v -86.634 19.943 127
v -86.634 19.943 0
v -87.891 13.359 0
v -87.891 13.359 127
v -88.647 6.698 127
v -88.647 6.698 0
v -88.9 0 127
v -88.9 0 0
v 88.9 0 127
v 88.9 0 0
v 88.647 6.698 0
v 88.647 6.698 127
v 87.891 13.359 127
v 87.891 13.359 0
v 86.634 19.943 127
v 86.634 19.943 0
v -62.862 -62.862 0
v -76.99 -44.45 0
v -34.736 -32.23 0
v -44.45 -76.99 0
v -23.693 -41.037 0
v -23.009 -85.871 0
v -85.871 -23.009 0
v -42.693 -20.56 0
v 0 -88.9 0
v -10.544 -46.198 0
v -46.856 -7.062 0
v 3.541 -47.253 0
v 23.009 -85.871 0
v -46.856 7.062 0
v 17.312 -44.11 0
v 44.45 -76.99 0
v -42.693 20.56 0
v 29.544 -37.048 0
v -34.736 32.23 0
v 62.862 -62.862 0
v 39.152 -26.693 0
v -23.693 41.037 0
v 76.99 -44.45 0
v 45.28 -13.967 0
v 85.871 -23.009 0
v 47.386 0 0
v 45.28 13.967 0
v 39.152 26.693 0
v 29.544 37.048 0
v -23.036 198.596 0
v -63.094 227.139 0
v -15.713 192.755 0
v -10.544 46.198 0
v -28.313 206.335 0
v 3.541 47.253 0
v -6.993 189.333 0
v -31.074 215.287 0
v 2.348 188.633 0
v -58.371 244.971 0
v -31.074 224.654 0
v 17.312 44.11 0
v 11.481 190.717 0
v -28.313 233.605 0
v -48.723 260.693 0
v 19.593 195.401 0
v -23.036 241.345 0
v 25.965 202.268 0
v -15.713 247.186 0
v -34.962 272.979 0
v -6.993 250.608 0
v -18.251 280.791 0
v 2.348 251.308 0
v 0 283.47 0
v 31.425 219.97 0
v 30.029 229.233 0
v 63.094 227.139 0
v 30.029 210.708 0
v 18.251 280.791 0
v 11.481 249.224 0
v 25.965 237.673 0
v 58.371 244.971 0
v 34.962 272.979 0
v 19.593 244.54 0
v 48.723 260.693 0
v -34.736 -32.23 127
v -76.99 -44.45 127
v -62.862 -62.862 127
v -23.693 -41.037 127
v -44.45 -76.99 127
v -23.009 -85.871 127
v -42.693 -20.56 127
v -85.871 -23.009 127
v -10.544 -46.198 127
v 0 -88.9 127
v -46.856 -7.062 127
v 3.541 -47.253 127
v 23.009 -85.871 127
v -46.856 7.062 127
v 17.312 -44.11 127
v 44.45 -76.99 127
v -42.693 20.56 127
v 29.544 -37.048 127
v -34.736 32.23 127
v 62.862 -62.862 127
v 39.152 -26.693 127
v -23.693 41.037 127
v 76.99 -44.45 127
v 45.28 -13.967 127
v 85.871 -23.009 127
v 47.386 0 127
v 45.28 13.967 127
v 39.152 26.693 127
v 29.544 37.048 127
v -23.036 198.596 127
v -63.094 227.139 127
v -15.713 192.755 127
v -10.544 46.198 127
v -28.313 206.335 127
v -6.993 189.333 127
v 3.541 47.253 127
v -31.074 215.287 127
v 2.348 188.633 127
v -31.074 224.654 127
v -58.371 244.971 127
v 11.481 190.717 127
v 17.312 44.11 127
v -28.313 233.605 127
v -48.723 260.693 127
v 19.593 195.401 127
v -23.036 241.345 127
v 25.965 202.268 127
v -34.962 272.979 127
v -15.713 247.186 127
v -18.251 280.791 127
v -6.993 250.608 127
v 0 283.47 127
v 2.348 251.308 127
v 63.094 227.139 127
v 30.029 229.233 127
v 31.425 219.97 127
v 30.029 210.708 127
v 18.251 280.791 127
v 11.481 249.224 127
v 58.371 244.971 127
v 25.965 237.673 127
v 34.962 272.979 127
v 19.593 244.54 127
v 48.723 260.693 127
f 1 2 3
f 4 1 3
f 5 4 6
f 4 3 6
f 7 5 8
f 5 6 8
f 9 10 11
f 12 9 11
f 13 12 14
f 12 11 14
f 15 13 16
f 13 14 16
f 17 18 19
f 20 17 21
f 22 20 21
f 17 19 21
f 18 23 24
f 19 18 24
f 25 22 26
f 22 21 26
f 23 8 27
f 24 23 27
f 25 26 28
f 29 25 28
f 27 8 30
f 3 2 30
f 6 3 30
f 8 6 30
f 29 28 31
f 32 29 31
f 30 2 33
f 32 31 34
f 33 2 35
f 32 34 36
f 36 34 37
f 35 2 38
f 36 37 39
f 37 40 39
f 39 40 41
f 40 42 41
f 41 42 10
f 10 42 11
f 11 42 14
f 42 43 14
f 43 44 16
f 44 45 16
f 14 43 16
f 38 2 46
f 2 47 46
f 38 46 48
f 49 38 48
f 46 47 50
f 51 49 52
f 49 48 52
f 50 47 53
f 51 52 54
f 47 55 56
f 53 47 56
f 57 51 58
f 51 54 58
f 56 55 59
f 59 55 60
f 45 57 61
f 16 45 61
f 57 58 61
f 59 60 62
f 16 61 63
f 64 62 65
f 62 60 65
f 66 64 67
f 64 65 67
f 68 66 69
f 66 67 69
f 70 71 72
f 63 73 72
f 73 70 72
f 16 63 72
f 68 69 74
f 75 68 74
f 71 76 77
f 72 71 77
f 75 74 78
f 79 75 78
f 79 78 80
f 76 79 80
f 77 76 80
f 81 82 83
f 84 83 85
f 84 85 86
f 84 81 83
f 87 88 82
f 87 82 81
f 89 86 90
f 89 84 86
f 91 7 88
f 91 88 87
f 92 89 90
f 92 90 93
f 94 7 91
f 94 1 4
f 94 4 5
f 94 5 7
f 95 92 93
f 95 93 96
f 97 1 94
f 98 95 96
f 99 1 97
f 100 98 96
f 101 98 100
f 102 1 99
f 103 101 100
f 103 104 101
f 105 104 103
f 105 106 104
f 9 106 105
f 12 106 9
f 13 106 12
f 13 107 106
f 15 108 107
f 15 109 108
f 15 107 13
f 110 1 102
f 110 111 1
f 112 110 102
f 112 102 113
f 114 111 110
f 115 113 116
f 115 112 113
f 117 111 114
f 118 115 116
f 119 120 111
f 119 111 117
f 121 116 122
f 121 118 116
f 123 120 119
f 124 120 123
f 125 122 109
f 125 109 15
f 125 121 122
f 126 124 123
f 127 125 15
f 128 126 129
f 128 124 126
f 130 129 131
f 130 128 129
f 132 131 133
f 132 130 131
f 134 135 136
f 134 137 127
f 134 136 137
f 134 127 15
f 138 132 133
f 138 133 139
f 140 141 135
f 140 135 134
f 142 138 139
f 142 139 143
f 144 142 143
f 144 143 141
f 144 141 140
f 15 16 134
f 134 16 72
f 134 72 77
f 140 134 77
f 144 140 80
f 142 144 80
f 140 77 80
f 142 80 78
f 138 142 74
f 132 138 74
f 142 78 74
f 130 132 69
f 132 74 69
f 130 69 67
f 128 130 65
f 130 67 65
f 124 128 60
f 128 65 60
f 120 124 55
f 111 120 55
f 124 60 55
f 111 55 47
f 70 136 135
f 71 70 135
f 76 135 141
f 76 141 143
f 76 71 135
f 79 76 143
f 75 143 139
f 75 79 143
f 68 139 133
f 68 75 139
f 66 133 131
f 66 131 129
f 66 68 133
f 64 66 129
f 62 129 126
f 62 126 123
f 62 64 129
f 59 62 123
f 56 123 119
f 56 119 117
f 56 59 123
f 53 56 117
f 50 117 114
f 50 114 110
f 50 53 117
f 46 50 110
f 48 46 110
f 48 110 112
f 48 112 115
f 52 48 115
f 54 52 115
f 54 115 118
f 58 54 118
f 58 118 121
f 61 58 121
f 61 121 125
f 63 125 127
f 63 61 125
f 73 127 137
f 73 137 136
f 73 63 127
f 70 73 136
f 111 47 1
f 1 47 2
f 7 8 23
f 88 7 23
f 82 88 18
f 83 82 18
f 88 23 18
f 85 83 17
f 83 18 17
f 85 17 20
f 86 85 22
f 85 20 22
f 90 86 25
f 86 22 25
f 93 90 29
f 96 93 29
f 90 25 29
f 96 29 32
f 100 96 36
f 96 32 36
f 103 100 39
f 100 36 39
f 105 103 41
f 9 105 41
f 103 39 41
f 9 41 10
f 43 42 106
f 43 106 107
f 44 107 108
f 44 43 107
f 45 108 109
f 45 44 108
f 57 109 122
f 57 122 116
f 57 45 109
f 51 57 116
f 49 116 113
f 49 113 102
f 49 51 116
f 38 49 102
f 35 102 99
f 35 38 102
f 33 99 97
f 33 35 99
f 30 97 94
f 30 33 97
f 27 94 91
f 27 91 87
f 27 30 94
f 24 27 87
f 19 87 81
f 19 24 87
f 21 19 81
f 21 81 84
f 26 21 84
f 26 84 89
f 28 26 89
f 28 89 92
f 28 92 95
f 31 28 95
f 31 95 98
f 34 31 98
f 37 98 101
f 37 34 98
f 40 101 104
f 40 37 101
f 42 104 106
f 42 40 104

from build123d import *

# Parameters (mm, degrees)
F0_R     = 47.385597
F0_R_2   = 31.425438
F1_DEPTH = 127


with BuildPart() as f1:
    # F0 (on Top) → F1 (new body)
    with BuildSketch(Plane.XY):
        with BuildLine():
            Line((-86.634222, 19.942958), (-88.9, 0))
            ThreePointArc((-88.9, 0), (0, -88.9), (88.9, 0))
            Line((88.9, 0), (86.634222, 19.942958))
            ThreePointArc((86.634222, 19.942958), (0, 88.9), (-86.634222, 19.942958))
        make_face()
        Circle(F0_R, mode=Mode.SUBTRACT)
        with BuildLine():
            ThreePointArc((-86.634222, 19.942958), (-88.331739, 10.035628), (-88.9, 0))
            Line((-88.9, 0), (-86.634222, 19.942958))
        make_face()
        with BuildLine():
            Line((86.634222, 19.942958), (88.9, 0))
            ThreePointArc((88.9, 0), (88.331739, 10.035628), (86.634222, 19.942958))
        make_face()
        with BuildLine():
            Line((-63.0941, 227.138758), (-86.634222, 19.942958))
            ThreePointArc((-86.634222, 19.942958), (0, 88.9), (86.634222, 19.942958))
            Line((86.634222, 19.942958), (63.0941, 227.138758))
            ThreePointArc((63.0941, 227.138758), (63.398444, 223.560347), (63.5, 219.970453))
            ThreePointArc((63.5, 219.970453), (-3.589894, 156.572009), (-63.0941, 227.138758))
        make_face()
        with BuildLine():
            ThreePointArc((63.0941, 227.138758), (0, 283.470453), (-63.0941, 227.138758))
            ThreePointArc((-63.0941, 227.138758), (-3.589894, 156.572009), (63.5, 219.970453))
            ThreePointArc((63.5, 219.970453), (63.398444, 223.560347), (63.0941, 227.138758))
        make_face()
        with Locations((0, 219.970453)):
            Circle(F0_R_2, mode=Mode.SUBTRACT)
    extrude(amount=F1_DEPTH)


solid = f1.part
